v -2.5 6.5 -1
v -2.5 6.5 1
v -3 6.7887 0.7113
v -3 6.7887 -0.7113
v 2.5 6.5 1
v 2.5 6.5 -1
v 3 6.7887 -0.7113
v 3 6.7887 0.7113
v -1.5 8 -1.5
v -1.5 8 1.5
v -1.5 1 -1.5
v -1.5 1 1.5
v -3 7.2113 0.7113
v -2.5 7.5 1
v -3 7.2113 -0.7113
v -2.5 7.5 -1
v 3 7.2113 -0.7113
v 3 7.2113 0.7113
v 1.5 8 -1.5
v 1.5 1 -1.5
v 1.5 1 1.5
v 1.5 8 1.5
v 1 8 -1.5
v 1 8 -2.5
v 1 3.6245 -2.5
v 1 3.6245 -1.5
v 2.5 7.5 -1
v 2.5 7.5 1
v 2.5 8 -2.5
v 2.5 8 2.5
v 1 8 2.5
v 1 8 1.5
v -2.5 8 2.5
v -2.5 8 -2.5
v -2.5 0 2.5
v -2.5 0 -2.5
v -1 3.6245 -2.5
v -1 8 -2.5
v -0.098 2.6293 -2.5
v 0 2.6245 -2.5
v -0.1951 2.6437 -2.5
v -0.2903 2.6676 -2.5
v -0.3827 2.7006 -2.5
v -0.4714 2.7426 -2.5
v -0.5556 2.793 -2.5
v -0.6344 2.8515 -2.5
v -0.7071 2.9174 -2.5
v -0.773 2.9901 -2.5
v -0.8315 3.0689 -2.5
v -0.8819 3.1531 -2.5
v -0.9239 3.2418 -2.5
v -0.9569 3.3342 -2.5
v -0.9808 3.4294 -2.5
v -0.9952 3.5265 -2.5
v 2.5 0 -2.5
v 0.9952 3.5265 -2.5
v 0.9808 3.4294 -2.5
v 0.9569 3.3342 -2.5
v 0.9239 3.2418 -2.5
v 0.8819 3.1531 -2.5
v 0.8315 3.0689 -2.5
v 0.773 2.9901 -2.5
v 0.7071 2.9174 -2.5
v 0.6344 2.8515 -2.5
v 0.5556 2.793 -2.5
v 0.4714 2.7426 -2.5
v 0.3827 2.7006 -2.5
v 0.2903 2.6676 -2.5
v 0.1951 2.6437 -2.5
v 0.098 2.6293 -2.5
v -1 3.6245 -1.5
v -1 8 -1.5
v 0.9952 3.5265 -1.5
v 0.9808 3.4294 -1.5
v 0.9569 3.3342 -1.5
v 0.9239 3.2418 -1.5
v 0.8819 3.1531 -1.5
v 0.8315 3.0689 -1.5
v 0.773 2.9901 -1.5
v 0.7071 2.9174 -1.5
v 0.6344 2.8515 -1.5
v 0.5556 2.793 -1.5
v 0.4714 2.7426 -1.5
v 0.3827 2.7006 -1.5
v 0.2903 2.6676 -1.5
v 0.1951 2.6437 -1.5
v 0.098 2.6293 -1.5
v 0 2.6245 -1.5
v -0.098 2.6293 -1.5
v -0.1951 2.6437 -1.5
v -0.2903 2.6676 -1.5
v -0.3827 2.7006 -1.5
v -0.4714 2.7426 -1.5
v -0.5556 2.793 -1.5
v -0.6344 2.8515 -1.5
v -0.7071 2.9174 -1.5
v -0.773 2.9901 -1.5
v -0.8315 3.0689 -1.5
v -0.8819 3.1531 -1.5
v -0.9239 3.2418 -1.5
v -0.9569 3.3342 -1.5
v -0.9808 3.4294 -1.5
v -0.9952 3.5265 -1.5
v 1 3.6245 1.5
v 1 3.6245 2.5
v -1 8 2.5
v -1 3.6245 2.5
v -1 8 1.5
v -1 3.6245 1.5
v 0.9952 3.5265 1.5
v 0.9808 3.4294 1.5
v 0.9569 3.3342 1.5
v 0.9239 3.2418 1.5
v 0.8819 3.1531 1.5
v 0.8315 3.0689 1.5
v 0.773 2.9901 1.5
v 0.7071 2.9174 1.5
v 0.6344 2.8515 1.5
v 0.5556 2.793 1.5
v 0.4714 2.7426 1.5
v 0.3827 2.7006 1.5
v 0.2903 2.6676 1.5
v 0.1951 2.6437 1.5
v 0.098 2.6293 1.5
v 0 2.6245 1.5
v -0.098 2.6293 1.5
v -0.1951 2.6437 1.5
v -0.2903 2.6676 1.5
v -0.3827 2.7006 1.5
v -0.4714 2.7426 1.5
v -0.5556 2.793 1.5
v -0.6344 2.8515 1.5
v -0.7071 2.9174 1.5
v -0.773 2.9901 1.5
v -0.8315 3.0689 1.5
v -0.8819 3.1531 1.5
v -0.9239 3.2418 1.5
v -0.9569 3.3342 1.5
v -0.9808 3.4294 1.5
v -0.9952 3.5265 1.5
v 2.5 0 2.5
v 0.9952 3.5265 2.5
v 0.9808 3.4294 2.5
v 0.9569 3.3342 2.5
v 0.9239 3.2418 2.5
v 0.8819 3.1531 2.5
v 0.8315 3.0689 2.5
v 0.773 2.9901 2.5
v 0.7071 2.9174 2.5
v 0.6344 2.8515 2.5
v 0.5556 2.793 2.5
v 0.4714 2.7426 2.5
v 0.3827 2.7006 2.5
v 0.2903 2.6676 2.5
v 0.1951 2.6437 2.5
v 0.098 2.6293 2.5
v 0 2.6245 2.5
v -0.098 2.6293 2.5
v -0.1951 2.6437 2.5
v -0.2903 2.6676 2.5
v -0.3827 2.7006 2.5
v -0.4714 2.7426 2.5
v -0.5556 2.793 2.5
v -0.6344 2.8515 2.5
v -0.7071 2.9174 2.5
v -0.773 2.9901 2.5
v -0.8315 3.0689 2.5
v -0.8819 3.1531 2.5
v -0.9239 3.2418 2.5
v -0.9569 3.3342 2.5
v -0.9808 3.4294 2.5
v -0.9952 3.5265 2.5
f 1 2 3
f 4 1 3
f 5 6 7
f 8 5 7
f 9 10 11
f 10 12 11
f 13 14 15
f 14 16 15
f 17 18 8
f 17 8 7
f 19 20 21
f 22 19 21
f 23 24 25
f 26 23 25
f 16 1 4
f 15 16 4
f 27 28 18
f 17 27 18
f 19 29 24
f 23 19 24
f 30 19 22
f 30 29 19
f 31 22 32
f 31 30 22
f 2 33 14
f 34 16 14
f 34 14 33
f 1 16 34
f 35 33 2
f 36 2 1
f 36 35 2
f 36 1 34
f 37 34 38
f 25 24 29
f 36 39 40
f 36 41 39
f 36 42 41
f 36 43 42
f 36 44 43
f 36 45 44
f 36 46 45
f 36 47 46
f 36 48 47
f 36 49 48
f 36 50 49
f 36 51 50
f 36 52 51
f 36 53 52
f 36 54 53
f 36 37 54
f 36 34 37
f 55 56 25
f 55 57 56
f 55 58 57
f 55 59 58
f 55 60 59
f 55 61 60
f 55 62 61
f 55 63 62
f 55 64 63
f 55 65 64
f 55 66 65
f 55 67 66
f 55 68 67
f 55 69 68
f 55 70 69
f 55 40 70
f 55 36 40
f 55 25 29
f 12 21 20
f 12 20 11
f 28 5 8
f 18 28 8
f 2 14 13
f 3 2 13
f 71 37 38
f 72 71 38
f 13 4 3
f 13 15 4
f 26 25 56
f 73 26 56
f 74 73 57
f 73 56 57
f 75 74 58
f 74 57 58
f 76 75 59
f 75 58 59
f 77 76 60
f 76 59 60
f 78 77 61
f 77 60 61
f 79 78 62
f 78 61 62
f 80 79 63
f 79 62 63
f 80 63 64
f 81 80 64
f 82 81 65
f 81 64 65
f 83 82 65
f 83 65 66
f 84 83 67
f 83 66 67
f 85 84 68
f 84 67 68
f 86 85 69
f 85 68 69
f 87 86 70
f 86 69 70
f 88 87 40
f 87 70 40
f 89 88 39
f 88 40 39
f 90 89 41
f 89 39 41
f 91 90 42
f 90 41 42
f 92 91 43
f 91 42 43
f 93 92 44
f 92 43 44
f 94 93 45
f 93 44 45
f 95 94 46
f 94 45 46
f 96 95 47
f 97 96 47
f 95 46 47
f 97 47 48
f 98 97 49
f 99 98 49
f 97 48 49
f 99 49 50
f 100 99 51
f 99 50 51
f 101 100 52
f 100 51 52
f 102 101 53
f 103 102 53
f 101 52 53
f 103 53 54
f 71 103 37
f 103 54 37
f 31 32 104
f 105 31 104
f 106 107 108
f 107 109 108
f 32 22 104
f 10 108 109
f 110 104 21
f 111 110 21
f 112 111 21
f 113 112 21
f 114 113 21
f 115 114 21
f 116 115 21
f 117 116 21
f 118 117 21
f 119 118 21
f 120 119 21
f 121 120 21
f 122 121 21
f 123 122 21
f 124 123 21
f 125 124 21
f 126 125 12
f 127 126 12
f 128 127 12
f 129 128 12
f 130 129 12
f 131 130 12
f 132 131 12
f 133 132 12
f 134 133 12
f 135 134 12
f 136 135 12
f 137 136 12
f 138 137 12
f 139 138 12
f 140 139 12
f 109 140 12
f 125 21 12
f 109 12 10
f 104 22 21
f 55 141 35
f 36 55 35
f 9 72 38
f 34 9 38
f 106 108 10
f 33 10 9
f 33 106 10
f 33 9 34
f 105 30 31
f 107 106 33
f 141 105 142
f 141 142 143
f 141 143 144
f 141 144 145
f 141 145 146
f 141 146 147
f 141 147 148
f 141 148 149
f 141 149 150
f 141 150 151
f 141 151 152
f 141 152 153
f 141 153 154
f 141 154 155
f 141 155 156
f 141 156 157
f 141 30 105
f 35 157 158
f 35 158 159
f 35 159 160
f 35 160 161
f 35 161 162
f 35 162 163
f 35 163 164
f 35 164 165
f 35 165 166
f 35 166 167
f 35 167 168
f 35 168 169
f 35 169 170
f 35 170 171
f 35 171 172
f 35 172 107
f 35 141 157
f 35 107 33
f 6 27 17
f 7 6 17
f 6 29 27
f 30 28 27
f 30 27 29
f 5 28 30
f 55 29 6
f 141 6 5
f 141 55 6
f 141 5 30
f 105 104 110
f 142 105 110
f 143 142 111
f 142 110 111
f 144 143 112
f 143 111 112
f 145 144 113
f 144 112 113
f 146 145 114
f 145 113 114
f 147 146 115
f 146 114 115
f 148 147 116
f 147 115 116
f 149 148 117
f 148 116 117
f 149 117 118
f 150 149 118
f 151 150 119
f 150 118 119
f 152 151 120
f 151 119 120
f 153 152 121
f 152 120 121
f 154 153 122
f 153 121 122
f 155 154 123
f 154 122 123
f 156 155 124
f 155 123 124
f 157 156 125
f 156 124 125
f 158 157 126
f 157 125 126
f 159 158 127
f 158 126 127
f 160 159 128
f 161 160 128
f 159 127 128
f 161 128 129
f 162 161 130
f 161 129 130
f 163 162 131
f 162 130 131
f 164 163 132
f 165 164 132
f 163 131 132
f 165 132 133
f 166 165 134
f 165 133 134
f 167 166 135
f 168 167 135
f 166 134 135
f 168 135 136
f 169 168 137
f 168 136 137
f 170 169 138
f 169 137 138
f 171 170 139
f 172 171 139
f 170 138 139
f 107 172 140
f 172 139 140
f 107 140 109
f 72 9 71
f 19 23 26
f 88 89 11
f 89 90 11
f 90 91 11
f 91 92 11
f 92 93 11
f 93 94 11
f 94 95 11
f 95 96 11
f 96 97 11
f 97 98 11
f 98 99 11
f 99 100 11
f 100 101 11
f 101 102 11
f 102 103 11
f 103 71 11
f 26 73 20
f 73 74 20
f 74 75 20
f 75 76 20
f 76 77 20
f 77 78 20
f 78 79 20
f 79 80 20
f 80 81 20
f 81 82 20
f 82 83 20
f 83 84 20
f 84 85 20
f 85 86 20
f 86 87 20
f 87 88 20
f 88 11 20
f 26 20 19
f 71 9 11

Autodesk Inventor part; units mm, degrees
ref_plane "YZ Plane" through (0, 0, 0) normal (1, 0, 0) x (0, 1, 0)
ref_plane "XZ Plane" through (0, 0, 0) normal (0, 1, 0) x (-1, 0, 0)
ref_plane "XY Plane" through (0, 0, 0) normal (0, 0, 1) x (1, 0, 0)
sketch "Sketch1" plane through (0, 0, 0) normal (0, 1, 0) x (-1, 0, 0)
  line L0 (-2.5, 2.5) -> (2.5, 2.5)
  line L1 (2.5, 2.5) -> (2.5, -2.5)
  line L2 (2.5, -2.5) -> (-2.5, -2.5)
  line L3 (-2.5, -2.5) -> (-2.5, 2.5)
  line L4 (-2.5, 2.5) -> (2.5, -2.5) construction
  line L5 (2.5, 2.5) -> (-2.5, -2.5) construction
  point P0 (0, 0)
  dimension "d0" = 5
  dimension "d1" = 5
extrude "Extrusion1" add sketch "Sketch1" along normal blind 8
shell "Shell1" thickness 1 removed faces 1 at (-0.8333, 8, -0.8333)
sketch "Sketch9" plane through (2.5, 0, 2.5) normal (1, 0, 0) x (0, 0, -1)
  line L0 (1.5, 6.5) -> (3.5, 6.5)
  line L1 (3.5, 6.5) -> (3.5, 7.5)
  line L2 (3.5, 7.5) -> (1.5, 7.5)
  line L3 (1.5, 7.5) -> (1.5, 6.5)
  line L4 (1.5, 6.5) -> (3.5, 7.5) construction
  line L5 (3.5, 6.5) -> (1.5, 7.5) construction
  line L6 (0, 8) -> (5, 8) projected
  point P0 (2.5, 0)
  point P1 (2.5, 7)
  dimension "d10" = 1
  dimension "d14" = 2
  dimension "d15" = 1
extrude "Extrusion4" add sketch "Sketch9" along normal blind 0.5 draft -30
sketch "Sketch10" plane through (-2.5, 0, -2.5) normal (-1, 0, 0) x (0, 0, 1)
  line L0 (1.5, 6.5) -> (3.5, 6.5)
  line L1 (3.5, 6.5) -> (3.5, 7.5)
  line L2 (3.5, 7.5) -> (1.5, 7.5)
  line L3 (1.5, 7.5) -> (1.5, 6.5)
  line L4 (1.5, 6.5) -> (3.5, 7.5) construction
  line L5 (3.5, 6.5) -> (1.5, 7.5) construction
  line L6 (0, 8) -> (5, 8) projected
  point P0 (2.5, 0)
  point P1 (2.5, 7)
  dimension "d13" = 1
  dimension "d16" = 2
  dimension "d17" = 1
extrude "Extrusion5" add sketch "Sketch10" along normal blind 0.5 draft -30
sketch "Sketch11" plane through (2.5, 0, -2.5) normal (0, 0, -1) x (-1, 0, 0)
  line L0 (2.5, 7.862) -> (2.5, 3.6245) construction
  line L1 (1.5, 7.862) -> (1.5, 3.6245)
  line L2 (3.5, 3.6245) -> (3.5, 7.862)
  arc A0 (3.5, 7.862) -> (1.5, 7.862) centre (2.5, 7.862) ccw
  arc A1 (1.5, 3.6245) -> (3.5, 3.6245) centre (2.5, 3.6245) ccw
  point P0 (2.5, 0)
  point P1 (2.5, 5.7432)
  dimension "d20" = 2
extrude "Extrusion6" cut sketch "Sketch11" against normal through all
sketch "Sketch12" plane through (2.5, 0, -2.5) normal (0, 0, -1) x (-1, 0, 0)
  line L0 (1.5, 7.862) -> (1.5, 3.6245) projected
  line L1 (1.5, 7.862) -> (3.5, 7.862)
  line L2 (3.5, 7.862) -> (3.5, 10.4679)
  line L3 (3.5, 10.4679) -> (1.5, 10.4679)
  line L4 (1.5, 10.4679) -> (1.5, 7.862)
  point P0 (2.5, 0)
  dimension "d23" = 2
extrude "Extrusion7" cut sketch "Sketch12" against normal through all
equation "\"d16\" = d14"
equation "\"d17\" = d15"
properties part number "snapfit_part_v02"
